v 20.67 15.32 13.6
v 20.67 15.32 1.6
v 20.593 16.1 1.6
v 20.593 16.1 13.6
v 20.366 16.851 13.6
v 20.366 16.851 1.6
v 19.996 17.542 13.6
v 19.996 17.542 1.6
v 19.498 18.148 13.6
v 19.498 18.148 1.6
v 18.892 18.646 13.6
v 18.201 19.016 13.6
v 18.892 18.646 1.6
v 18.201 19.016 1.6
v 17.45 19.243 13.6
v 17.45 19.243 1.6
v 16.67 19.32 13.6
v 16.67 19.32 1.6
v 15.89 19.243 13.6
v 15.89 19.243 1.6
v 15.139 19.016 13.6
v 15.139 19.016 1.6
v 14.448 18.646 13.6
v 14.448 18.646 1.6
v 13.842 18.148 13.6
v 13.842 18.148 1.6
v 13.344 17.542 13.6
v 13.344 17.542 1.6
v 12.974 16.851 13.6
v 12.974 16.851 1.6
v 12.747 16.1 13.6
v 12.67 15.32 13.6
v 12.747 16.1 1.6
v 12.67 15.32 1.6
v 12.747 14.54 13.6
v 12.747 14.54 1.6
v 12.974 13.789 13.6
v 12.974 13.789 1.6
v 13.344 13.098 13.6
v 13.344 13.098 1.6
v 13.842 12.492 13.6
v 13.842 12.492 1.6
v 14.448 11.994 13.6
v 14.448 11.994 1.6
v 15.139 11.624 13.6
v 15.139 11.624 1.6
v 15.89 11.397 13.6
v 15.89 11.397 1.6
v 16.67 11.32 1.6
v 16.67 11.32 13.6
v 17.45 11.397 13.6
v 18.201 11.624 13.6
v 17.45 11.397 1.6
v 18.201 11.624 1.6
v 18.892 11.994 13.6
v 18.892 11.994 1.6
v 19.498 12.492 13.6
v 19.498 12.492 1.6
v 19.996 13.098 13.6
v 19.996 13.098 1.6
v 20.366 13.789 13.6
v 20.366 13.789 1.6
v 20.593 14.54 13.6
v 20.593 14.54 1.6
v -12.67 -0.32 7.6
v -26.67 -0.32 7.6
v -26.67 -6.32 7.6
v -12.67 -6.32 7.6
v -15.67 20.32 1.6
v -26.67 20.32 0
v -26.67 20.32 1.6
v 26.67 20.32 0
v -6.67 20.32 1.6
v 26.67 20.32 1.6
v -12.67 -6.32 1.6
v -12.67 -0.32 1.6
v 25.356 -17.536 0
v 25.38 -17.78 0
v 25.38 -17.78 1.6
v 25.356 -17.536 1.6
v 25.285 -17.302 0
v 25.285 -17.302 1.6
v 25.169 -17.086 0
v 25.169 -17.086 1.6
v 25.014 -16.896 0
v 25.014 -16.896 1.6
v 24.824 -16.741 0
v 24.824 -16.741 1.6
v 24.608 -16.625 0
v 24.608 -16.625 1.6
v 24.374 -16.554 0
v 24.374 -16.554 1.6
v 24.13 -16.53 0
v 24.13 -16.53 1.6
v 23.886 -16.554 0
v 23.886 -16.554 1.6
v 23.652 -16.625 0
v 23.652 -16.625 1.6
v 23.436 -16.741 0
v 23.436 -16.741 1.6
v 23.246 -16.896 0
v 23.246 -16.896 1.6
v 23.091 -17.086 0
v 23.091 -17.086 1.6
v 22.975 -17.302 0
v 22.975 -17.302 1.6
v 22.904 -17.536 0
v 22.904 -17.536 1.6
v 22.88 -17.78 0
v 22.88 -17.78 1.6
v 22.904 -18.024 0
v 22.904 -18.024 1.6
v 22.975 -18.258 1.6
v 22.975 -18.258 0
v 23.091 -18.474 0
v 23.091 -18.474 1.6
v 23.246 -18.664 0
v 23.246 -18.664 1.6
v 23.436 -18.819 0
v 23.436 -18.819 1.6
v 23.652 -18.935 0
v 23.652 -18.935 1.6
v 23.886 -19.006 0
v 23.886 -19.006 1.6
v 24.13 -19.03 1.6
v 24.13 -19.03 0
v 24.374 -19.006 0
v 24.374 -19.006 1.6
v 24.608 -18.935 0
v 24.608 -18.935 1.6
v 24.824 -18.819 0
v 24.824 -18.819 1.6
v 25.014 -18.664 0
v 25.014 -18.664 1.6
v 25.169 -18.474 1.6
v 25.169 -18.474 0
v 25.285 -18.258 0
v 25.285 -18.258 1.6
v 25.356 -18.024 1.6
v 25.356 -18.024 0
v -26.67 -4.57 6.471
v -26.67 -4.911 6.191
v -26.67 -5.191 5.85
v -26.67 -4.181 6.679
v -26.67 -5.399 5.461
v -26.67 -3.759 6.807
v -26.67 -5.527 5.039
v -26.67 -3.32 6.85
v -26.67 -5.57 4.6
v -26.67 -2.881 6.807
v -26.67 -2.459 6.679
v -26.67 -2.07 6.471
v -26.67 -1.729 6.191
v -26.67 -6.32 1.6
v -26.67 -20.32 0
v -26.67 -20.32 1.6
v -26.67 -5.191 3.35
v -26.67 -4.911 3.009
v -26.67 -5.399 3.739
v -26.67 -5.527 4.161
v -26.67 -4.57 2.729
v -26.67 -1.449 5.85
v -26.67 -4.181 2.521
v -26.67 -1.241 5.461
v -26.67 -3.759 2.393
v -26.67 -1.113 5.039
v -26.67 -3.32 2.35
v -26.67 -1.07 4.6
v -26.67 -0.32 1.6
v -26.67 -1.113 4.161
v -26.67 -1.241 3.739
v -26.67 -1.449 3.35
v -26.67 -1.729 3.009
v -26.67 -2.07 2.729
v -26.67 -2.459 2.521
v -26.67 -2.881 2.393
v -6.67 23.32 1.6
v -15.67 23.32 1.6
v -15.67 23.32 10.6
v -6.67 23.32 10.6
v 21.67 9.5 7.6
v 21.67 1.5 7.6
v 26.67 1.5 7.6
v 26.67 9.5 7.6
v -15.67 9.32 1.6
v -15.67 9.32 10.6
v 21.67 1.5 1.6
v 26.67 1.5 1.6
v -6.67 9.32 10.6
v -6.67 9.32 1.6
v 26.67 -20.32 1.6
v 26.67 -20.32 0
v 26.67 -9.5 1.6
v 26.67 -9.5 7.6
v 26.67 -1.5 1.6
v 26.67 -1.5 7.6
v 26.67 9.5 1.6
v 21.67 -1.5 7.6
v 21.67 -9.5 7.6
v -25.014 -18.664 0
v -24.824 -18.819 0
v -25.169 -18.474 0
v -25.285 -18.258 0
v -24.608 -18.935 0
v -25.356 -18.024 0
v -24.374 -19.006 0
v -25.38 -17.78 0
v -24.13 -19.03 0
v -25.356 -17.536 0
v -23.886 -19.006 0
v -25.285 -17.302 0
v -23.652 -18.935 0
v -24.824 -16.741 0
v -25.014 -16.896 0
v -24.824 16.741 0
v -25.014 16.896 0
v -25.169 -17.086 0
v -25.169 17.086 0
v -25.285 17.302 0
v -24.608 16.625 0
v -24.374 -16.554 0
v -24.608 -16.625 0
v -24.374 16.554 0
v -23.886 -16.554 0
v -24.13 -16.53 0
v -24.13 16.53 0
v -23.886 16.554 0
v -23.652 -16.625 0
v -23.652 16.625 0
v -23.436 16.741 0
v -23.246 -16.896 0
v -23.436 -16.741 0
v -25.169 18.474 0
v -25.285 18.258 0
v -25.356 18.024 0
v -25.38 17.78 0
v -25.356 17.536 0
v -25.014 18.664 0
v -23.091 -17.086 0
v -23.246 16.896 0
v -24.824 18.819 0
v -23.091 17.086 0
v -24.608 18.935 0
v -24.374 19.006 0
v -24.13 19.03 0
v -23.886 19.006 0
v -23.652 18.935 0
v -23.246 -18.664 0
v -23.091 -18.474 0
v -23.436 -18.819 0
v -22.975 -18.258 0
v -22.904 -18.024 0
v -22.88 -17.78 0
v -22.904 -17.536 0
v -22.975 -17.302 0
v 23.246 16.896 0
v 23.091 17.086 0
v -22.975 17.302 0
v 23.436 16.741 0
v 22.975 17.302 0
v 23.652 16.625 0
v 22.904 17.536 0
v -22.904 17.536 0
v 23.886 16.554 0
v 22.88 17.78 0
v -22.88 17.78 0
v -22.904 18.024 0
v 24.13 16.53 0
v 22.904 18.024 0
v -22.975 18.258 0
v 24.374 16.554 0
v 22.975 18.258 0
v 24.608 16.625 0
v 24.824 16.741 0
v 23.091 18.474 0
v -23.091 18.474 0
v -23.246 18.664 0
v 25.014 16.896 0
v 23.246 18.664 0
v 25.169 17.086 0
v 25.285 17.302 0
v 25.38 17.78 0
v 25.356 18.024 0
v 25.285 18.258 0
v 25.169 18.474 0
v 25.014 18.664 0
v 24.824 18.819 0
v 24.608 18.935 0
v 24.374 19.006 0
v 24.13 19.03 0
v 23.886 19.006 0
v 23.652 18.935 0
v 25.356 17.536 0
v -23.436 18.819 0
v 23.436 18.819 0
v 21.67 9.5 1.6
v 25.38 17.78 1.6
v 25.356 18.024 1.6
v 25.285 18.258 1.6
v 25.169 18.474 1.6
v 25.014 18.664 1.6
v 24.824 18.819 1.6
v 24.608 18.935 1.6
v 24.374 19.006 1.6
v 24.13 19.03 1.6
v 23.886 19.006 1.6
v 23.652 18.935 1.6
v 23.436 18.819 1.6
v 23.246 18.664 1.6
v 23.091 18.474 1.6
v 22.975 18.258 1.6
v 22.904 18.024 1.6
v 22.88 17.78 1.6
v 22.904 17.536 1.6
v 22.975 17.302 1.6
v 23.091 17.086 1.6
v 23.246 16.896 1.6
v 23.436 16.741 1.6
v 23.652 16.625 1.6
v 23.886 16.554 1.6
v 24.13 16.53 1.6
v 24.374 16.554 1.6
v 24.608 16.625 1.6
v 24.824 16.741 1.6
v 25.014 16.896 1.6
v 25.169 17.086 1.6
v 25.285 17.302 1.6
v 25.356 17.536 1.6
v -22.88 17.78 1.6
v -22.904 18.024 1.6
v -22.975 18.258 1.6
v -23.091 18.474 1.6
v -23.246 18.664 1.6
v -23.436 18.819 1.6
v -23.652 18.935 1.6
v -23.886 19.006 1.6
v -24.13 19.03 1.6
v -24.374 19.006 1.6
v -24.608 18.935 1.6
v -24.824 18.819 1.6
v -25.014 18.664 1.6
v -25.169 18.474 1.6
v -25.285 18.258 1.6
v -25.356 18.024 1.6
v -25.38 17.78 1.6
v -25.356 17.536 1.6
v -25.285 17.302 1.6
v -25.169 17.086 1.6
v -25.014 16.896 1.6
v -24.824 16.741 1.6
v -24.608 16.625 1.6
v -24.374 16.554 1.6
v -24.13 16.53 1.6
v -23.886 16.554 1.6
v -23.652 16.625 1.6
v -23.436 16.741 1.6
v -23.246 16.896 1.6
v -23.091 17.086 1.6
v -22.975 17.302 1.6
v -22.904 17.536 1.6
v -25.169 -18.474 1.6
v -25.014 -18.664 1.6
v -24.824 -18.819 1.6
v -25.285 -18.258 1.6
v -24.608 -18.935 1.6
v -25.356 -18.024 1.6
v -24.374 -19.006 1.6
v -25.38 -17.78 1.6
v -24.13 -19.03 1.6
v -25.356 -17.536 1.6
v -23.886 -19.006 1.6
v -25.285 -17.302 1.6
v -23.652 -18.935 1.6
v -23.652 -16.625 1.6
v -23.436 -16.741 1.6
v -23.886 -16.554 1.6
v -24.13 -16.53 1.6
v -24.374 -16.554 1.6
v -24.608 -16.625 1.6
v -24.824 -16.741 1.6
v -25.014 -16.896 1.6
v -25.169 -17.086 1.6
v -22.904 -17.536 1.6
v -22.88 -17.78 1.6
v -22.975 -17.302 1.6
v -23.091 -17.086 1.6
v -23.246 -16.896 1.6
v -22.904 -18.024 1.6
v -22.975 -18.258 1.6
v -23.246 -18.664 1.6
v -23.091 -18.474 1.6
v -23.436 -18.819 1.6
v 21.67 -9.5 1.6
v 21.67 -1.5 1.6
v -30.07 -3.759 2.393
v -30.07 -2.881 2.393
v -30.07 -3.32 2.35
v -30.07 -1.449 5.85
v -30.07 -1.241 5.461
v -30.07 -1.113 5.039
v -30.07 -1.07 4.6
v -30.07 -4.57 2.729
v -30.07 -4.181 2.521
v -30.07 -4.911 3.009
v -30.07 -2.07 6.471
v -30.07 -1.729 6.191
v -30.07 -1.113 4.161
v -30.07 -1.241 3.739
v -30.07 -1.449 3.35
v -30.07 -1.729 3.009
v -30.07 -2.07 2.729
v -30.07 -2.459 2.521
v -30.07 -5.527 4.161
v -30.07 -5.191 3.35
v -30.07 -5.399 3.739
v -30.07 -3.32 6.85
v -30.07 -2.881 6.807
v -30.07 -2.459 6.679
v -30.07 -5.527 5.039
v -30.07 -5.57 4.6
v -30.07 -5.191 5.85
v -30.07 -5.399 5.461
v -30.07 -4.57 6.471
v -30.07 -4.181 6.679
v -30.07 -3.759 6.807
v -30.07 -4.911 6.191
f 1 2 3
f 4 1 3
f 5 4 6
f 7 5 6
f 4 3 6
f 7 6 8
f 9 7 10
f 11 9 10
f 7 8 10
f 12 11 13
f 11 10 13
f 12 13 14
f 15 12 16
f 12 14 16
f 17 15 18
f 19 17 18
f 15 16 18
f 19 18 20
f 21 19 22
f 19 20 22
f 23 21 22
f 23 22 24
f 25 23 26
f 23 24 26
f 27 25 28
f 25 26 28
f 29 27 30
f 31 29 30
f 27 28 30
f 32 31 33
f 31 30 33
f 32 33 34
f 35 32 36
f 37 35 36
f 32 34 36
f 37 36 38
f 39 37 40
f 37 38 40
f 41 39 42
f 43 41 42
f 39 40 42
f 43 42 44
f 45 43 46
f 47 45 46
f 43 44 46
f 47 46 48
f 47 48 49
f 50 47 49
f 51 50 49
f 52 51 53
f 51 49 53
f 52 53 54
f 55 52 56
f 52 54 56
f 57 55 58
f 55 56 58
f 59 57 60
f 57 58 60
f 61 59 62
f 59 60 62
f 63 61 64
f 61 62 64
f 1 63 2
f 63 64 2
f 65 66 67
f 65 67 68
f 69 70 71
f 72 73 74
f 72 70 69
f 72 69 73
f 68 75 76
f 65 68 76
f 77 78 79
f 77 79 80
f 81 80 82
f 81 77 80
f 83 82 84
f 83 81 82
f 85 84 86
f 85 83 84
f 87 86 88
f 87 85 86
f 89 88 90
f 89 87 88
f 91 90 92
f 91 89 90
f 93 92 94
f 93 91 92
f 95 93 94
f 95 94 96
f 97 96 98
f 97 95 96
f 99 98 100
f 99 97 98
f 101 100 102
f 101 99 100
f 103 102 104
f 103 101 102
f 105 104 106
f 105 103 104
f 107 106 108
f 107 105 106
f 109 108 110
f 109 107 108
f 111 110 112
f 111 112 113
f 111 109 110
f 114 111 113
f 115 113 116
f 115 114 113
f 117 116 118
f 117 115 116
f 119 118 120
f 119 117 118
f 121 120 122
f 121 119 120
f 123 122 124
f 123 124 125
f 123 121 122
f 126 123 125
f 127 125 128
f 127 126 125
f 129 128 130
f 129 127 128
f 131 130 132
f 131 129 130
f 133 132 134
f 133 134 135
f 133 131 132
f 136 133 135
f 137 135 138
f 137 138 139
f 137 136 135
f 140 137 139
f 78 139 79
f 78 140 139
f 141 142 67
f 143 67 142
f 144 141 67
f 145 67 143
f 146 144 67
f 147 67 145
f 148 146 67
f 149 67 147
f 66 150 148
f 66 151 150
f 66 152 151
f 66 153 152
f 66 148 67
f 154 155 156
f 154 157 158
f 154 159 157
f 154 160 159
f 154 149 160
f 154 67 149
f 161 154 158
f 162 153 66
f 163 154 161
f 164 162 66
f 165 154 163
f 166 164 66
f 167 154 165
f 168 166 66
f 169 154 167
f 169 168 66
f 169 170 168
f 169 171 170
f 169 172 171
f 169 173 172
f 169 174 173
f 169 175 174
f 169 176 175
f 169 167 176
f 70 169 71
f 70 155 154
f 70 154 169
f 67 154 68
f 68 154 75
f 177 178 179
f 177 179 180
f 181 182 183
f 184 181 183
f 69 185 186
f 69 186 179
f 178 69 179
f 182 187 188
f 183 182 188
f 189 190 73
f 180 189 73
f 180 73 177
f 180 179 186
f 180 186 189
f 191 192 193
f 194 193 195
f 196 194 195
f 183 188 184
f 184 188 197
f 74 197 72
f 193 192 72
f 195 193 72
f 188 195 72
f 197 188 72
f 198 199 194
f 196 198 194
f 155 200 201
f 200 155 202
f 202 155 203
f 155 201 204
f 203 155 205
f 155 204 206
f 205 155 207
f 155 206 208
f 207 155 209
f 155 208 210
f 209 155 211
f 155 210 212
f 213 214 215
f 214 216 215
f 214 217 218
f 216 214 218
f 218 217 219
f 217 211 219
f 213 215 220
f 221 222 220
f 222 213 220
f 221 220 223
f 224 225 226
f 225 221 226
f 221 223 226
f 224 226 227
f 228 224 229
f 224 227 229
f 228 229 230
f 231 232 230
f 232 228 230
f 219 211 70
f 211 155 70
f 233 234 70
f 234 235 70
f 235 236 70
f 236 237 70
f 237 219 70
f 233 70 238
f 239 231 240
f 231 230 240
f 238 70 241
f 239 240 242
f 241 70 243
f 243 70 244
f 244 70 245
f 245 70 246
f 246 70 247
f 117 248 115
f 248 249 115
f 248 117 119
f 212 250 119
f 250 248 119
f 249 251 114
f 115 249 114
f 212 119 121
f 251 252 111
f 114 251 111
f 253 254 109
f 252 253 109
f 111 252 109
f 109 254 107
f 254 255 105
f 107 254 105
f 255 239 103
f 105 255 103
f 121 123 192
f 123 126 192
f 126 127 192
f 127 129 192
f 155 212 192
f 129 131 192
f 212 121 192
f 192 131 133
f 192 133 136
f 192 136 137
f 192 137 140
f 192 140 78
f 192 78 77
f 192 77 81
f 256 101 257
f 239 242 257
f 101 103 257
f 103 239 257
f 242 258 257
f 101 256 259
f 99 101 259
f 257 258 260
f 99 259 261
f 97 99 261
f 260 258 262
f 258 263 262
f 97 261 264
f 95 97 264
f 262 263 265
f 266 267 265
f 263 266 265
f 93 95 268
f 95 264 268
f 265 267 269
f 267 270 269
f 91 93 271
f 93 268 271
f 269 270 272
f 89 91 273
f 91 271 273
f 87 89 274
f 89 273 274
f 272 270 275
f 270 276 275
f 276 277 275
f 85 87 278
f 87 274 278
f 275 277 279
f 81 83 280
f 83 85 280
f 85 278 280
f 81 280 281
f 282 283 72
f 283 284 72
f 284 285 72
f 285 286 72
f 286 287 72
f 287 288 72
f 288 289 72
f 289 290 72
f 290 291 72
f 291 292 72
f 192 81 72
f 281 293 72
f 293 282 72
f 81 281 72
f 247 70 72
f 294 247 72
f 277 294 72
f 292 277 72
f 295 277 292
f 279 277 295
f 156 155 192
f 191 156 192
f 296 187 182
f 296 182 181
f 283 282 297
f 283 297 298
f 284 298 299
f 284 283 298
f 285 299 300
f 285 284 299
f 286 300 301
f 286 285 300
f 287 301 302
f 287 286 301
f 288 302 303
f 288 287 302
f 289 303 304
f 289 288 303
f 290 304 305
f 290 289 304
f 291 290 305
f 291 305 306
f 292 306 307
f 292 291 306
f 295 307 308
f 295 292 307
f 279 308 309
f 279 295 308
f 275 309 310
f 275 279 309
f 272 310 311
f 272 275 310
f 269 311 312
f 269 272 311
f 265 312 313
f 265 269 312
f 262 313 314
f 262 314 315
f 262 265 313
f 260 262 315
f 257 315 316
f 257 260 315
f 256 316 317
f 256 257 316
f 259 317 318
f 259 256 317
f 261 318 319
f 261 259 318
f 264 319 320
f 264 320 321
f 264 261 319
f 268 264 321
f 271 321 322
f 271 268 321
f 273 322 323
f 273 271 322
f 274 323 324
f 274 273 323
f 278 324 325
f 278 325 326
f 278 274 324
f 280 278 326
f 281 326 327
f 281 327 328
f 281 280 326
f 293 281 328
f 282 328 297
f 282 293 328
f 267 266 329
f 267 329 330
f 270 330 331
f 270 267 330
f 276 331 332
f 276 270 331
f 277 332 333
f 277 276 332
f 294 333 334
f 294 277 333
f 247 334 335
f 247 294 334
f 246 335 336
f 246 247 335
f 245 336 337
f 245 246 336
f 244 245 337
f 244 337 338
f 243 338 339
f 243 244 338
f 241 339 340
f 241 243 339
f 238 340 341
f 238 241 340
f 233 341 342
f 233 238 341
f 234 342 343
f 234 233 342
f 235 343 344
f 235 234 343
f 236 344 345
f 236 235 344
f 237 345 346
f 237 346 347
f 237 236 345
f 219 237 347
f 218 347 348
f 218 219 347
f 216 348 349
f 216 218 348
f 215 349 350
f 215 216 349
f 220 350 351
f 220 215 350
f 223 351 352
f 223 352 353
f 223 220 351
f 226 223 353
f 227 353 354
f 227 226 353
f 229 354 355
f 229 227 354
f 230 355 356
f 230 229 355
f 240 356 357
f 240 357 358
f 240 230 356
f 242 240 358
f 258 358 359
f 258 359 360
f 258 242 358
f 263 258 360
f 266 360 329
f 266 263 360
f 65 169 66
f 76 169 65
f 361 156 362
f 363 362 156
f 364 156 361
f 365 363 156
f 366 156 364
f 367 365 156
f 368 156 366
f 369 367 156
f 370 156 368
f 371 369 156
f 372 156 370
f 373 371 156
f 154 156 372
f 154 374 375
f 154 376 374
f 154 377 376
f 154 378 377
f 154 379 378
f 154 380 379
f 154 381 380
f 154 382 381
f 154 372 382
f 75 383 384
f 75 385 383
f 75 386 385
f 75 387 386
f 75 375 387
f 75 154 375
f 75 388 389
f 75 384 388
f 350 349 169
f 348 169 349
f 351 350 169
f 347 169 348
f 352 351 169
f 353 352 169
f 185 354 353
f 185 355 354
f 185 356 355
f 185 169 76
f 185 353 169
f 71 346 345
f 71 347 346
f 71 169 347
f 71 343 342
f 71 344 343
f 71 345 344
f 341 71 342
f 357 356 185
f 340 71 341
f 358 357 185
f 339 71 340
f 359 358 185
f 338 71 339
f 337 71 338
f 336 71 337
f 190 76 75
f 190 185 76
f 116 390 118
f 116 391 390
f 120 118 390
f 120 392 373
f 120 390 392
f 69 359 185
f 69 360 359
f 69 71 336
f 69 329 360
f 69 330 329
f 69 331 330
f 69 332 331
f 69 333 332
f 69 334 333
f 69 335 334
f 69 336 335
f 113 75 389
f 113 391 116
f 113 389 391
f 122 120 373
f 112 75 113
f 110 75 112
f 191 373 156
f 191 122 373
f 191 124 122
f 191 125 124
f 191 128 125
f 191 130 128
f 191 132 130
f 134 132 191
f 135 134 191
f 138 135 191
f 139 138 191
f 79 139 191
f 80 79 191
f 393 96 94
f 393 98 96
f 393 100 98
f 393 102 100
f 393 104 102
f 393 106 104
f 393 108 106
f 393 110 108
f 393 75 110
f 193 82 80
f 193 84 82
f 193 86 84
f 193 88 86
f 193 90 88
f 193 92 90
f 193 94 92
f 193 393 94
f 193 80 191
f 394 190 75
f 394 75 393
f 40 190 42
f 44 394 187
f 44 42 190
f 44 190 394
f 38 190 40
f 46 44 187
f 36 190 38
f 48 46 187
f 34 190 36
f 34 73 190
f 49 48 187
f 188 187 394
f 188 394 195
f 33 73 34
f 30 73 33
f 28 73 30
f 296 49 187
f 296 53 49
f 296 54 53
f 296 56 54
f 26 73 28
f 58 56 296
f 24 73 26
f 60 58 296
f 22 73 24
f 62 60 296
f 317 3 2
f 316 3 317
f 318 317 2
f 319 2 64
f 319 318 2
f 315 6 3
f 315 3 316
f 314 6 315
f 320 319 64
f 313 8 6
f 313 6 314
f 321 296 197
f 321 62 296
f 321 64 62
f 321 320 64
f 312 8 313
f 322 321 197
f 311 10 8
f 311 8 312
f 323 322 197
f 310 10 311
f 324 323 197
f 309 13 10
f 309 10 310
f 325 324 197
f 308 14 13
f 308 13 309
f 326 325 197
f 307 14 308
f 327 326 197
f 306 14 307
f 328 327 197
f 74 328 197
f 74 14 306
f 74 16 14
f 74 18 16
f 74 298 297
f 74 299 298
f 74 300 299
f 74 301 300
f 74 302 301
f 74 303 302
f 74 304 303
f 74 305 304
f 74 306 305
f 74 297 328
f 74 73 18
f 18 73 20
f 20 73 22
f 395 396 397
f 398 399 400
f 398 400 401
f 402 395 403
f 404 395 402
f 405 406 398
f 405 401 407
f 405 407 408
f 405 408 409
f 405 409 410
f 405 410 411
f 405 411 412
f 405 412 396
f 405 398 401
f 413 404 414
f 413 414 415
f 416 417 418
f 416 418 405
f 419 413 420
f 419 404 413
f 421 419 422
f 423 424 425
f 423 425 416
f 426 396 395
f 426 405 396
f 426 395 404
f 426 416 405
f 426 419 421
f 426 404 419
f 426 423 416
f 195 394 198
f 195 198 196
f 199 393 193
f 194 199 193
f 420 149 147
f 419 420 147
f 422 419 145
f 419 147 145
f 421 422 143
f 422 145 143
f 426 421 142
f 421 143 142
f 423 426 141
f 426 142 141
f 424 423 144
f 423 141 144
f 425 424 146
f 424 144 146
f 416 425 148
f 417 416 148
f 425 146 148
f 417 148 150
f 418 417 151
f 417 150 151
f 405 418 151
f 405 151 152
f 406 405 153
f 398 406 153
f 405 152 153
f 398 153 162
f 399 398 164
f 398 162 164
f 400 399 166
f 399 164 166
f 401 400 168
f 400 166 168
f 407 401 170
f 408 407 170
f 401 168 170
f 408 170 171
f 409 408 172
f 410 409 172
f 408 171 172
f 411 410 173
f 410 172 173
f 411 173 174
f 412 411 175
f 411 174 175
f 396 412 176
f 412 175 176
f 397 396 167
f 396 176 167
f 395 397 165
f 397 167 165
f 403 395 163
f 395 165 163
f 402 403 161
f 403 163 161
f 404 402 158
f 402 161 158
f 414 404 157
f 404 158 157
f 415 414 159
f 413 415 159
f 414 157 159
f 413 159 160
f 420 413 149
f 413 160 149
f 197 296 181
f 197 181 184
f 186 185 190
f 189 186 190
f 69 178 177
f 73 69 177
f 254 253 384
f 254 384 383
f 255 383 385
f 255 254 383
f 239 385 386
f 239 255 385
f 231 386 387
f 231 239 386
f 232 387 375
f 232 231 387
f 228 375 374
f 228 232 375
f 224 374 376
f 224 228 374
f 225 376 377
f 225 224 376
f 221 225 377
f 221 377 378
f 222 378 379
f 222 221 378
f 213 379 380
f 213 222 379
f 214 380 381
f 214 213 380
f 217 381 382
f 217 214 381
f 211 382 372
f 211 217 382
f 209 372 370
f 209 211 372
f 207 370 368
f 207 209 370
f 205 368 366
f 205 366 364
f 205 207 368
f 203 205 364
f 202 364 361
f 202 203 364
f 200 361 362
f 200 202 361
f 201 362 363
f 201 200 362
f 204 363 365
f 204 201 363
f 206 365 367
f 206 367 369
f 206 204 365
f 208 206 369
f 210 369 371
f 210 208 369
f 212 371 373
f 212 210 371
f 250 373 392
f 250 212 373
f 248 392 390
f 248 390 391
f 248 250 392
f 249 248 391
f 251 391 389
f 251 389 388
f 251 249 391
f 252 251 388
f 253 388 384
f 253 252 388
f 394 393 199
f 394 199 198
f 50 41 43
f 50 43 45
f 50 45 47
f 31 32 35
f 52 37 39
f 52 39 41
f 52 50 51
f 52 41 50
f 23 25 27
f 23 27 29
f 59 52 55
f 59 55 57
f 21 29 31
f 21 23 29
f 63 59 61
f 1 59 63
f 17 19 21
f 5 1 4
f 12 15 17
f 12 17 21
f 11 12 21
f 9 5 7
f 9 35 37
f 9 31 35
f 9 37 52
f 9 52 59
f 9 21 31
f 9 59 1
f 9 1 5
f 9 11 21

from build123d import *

# Parameters (mm, degrees)
ESQUISSE1_W        = 53.34
ESQUISSE1_H        = 40.64
ESQUISSE1_R        = 1.25
BOSS_EXTRU_1_DEPTH = 1.6
ESQUISSE2_W        = 14
ESQUISSE2_H        = 6
ESQUISSE2_W_2      = 5
ESQUISSE2_H_2      = 8
BOSS_EXTRU_2_DEPTH = 6
ESQUISSE3_R        = 2.25
BOSS_EXTRU_3_DEPTH = 3.4
ESQUISSE4_W        = 9
ESQUISSE4_H        = 14
BOSS_EXTRU_4_DEPTH = 9
ESQUISSE5_R        = 4
BOSS_EXTRU_5_DEPTH = 12


with BuildPart() as part:
    # Esquisse1 → Boss.-Extru.1 (new body)
    with BuildSketch(Plane.XY):
        Rectangle(ESQUISSE1_W, ESQUISSE1_H)
        with Locations((-24.13, 17.78)):
            Circle(ESQUISSE1_R, mode=Mode.SUBTRACT)
        with Locations((24.13, -17.78)):
            Circle(ESQUISSE1_R, mode=Mode.SUBTRACT)
        with Locations((24.13, 17.78)):
            Circle(ESQUISSE1_R, mode=Mode.SUBTRACT)
        with Locations((-24.13, -17.78)):
            Circle(ESQUISSE1_R, mode=Mode.SUBTRACT)
    extrude(amount=BOSS_EXTRU_1_DEPTH)

    # Esquisse2 → Boss.-Extru.2 (add)
    with BuildSketch(Plane.XY.offset(1.6)):
        with Locations((-19.67, -3.32)):
            Rectangle(ESQUISSE2_W, ESQUISSE2_H)
        with Locations((24.17, 5.5)):
            Rectangle(ESQUISSE2_W_2, ESQUISSE2_H_2)
        with Locations((24.17, -5.5)):
            Rectangle(ESQUISSE2_W_2, ESQUISSE2_H_2)
    extrude(amount=BOSS_EXTRU_2_DEPTH)

    # Esquisse3 → Boss.-Extru.3 (add)
    with BuildSketch(Plane.ZY.offset(26.67)):
        with Locations(Location((4.6, -3.32, 0), (0, 0, 270))):
            Circle(ESQUISSE3_R)
    extrude(amount=BOSS_EXTRU_3_DEPTH)

    # Esquisse4 → Boss.-Extru.4 (add)
    with BuildSketch(Plane.XY.offset(1.6)):
        with Locations((-11.17, 16.32)):
            Rectangle(ESQUISSE4_W, ESQUISSE4_H)
    extrude(amount=BOSS_EXTRU_4_DEPTH)

    # Esquisse5 → Boss.-Extru.5 (add)
    with BuildSketch(Plane.XY.offset(1.6)):
        with Locations((16.67, 15.32)):
            Circle(ESQUISSE5_R)
    extrude(amount=BOSS_EXTRU_5_DEPTH)


solid = part.part
